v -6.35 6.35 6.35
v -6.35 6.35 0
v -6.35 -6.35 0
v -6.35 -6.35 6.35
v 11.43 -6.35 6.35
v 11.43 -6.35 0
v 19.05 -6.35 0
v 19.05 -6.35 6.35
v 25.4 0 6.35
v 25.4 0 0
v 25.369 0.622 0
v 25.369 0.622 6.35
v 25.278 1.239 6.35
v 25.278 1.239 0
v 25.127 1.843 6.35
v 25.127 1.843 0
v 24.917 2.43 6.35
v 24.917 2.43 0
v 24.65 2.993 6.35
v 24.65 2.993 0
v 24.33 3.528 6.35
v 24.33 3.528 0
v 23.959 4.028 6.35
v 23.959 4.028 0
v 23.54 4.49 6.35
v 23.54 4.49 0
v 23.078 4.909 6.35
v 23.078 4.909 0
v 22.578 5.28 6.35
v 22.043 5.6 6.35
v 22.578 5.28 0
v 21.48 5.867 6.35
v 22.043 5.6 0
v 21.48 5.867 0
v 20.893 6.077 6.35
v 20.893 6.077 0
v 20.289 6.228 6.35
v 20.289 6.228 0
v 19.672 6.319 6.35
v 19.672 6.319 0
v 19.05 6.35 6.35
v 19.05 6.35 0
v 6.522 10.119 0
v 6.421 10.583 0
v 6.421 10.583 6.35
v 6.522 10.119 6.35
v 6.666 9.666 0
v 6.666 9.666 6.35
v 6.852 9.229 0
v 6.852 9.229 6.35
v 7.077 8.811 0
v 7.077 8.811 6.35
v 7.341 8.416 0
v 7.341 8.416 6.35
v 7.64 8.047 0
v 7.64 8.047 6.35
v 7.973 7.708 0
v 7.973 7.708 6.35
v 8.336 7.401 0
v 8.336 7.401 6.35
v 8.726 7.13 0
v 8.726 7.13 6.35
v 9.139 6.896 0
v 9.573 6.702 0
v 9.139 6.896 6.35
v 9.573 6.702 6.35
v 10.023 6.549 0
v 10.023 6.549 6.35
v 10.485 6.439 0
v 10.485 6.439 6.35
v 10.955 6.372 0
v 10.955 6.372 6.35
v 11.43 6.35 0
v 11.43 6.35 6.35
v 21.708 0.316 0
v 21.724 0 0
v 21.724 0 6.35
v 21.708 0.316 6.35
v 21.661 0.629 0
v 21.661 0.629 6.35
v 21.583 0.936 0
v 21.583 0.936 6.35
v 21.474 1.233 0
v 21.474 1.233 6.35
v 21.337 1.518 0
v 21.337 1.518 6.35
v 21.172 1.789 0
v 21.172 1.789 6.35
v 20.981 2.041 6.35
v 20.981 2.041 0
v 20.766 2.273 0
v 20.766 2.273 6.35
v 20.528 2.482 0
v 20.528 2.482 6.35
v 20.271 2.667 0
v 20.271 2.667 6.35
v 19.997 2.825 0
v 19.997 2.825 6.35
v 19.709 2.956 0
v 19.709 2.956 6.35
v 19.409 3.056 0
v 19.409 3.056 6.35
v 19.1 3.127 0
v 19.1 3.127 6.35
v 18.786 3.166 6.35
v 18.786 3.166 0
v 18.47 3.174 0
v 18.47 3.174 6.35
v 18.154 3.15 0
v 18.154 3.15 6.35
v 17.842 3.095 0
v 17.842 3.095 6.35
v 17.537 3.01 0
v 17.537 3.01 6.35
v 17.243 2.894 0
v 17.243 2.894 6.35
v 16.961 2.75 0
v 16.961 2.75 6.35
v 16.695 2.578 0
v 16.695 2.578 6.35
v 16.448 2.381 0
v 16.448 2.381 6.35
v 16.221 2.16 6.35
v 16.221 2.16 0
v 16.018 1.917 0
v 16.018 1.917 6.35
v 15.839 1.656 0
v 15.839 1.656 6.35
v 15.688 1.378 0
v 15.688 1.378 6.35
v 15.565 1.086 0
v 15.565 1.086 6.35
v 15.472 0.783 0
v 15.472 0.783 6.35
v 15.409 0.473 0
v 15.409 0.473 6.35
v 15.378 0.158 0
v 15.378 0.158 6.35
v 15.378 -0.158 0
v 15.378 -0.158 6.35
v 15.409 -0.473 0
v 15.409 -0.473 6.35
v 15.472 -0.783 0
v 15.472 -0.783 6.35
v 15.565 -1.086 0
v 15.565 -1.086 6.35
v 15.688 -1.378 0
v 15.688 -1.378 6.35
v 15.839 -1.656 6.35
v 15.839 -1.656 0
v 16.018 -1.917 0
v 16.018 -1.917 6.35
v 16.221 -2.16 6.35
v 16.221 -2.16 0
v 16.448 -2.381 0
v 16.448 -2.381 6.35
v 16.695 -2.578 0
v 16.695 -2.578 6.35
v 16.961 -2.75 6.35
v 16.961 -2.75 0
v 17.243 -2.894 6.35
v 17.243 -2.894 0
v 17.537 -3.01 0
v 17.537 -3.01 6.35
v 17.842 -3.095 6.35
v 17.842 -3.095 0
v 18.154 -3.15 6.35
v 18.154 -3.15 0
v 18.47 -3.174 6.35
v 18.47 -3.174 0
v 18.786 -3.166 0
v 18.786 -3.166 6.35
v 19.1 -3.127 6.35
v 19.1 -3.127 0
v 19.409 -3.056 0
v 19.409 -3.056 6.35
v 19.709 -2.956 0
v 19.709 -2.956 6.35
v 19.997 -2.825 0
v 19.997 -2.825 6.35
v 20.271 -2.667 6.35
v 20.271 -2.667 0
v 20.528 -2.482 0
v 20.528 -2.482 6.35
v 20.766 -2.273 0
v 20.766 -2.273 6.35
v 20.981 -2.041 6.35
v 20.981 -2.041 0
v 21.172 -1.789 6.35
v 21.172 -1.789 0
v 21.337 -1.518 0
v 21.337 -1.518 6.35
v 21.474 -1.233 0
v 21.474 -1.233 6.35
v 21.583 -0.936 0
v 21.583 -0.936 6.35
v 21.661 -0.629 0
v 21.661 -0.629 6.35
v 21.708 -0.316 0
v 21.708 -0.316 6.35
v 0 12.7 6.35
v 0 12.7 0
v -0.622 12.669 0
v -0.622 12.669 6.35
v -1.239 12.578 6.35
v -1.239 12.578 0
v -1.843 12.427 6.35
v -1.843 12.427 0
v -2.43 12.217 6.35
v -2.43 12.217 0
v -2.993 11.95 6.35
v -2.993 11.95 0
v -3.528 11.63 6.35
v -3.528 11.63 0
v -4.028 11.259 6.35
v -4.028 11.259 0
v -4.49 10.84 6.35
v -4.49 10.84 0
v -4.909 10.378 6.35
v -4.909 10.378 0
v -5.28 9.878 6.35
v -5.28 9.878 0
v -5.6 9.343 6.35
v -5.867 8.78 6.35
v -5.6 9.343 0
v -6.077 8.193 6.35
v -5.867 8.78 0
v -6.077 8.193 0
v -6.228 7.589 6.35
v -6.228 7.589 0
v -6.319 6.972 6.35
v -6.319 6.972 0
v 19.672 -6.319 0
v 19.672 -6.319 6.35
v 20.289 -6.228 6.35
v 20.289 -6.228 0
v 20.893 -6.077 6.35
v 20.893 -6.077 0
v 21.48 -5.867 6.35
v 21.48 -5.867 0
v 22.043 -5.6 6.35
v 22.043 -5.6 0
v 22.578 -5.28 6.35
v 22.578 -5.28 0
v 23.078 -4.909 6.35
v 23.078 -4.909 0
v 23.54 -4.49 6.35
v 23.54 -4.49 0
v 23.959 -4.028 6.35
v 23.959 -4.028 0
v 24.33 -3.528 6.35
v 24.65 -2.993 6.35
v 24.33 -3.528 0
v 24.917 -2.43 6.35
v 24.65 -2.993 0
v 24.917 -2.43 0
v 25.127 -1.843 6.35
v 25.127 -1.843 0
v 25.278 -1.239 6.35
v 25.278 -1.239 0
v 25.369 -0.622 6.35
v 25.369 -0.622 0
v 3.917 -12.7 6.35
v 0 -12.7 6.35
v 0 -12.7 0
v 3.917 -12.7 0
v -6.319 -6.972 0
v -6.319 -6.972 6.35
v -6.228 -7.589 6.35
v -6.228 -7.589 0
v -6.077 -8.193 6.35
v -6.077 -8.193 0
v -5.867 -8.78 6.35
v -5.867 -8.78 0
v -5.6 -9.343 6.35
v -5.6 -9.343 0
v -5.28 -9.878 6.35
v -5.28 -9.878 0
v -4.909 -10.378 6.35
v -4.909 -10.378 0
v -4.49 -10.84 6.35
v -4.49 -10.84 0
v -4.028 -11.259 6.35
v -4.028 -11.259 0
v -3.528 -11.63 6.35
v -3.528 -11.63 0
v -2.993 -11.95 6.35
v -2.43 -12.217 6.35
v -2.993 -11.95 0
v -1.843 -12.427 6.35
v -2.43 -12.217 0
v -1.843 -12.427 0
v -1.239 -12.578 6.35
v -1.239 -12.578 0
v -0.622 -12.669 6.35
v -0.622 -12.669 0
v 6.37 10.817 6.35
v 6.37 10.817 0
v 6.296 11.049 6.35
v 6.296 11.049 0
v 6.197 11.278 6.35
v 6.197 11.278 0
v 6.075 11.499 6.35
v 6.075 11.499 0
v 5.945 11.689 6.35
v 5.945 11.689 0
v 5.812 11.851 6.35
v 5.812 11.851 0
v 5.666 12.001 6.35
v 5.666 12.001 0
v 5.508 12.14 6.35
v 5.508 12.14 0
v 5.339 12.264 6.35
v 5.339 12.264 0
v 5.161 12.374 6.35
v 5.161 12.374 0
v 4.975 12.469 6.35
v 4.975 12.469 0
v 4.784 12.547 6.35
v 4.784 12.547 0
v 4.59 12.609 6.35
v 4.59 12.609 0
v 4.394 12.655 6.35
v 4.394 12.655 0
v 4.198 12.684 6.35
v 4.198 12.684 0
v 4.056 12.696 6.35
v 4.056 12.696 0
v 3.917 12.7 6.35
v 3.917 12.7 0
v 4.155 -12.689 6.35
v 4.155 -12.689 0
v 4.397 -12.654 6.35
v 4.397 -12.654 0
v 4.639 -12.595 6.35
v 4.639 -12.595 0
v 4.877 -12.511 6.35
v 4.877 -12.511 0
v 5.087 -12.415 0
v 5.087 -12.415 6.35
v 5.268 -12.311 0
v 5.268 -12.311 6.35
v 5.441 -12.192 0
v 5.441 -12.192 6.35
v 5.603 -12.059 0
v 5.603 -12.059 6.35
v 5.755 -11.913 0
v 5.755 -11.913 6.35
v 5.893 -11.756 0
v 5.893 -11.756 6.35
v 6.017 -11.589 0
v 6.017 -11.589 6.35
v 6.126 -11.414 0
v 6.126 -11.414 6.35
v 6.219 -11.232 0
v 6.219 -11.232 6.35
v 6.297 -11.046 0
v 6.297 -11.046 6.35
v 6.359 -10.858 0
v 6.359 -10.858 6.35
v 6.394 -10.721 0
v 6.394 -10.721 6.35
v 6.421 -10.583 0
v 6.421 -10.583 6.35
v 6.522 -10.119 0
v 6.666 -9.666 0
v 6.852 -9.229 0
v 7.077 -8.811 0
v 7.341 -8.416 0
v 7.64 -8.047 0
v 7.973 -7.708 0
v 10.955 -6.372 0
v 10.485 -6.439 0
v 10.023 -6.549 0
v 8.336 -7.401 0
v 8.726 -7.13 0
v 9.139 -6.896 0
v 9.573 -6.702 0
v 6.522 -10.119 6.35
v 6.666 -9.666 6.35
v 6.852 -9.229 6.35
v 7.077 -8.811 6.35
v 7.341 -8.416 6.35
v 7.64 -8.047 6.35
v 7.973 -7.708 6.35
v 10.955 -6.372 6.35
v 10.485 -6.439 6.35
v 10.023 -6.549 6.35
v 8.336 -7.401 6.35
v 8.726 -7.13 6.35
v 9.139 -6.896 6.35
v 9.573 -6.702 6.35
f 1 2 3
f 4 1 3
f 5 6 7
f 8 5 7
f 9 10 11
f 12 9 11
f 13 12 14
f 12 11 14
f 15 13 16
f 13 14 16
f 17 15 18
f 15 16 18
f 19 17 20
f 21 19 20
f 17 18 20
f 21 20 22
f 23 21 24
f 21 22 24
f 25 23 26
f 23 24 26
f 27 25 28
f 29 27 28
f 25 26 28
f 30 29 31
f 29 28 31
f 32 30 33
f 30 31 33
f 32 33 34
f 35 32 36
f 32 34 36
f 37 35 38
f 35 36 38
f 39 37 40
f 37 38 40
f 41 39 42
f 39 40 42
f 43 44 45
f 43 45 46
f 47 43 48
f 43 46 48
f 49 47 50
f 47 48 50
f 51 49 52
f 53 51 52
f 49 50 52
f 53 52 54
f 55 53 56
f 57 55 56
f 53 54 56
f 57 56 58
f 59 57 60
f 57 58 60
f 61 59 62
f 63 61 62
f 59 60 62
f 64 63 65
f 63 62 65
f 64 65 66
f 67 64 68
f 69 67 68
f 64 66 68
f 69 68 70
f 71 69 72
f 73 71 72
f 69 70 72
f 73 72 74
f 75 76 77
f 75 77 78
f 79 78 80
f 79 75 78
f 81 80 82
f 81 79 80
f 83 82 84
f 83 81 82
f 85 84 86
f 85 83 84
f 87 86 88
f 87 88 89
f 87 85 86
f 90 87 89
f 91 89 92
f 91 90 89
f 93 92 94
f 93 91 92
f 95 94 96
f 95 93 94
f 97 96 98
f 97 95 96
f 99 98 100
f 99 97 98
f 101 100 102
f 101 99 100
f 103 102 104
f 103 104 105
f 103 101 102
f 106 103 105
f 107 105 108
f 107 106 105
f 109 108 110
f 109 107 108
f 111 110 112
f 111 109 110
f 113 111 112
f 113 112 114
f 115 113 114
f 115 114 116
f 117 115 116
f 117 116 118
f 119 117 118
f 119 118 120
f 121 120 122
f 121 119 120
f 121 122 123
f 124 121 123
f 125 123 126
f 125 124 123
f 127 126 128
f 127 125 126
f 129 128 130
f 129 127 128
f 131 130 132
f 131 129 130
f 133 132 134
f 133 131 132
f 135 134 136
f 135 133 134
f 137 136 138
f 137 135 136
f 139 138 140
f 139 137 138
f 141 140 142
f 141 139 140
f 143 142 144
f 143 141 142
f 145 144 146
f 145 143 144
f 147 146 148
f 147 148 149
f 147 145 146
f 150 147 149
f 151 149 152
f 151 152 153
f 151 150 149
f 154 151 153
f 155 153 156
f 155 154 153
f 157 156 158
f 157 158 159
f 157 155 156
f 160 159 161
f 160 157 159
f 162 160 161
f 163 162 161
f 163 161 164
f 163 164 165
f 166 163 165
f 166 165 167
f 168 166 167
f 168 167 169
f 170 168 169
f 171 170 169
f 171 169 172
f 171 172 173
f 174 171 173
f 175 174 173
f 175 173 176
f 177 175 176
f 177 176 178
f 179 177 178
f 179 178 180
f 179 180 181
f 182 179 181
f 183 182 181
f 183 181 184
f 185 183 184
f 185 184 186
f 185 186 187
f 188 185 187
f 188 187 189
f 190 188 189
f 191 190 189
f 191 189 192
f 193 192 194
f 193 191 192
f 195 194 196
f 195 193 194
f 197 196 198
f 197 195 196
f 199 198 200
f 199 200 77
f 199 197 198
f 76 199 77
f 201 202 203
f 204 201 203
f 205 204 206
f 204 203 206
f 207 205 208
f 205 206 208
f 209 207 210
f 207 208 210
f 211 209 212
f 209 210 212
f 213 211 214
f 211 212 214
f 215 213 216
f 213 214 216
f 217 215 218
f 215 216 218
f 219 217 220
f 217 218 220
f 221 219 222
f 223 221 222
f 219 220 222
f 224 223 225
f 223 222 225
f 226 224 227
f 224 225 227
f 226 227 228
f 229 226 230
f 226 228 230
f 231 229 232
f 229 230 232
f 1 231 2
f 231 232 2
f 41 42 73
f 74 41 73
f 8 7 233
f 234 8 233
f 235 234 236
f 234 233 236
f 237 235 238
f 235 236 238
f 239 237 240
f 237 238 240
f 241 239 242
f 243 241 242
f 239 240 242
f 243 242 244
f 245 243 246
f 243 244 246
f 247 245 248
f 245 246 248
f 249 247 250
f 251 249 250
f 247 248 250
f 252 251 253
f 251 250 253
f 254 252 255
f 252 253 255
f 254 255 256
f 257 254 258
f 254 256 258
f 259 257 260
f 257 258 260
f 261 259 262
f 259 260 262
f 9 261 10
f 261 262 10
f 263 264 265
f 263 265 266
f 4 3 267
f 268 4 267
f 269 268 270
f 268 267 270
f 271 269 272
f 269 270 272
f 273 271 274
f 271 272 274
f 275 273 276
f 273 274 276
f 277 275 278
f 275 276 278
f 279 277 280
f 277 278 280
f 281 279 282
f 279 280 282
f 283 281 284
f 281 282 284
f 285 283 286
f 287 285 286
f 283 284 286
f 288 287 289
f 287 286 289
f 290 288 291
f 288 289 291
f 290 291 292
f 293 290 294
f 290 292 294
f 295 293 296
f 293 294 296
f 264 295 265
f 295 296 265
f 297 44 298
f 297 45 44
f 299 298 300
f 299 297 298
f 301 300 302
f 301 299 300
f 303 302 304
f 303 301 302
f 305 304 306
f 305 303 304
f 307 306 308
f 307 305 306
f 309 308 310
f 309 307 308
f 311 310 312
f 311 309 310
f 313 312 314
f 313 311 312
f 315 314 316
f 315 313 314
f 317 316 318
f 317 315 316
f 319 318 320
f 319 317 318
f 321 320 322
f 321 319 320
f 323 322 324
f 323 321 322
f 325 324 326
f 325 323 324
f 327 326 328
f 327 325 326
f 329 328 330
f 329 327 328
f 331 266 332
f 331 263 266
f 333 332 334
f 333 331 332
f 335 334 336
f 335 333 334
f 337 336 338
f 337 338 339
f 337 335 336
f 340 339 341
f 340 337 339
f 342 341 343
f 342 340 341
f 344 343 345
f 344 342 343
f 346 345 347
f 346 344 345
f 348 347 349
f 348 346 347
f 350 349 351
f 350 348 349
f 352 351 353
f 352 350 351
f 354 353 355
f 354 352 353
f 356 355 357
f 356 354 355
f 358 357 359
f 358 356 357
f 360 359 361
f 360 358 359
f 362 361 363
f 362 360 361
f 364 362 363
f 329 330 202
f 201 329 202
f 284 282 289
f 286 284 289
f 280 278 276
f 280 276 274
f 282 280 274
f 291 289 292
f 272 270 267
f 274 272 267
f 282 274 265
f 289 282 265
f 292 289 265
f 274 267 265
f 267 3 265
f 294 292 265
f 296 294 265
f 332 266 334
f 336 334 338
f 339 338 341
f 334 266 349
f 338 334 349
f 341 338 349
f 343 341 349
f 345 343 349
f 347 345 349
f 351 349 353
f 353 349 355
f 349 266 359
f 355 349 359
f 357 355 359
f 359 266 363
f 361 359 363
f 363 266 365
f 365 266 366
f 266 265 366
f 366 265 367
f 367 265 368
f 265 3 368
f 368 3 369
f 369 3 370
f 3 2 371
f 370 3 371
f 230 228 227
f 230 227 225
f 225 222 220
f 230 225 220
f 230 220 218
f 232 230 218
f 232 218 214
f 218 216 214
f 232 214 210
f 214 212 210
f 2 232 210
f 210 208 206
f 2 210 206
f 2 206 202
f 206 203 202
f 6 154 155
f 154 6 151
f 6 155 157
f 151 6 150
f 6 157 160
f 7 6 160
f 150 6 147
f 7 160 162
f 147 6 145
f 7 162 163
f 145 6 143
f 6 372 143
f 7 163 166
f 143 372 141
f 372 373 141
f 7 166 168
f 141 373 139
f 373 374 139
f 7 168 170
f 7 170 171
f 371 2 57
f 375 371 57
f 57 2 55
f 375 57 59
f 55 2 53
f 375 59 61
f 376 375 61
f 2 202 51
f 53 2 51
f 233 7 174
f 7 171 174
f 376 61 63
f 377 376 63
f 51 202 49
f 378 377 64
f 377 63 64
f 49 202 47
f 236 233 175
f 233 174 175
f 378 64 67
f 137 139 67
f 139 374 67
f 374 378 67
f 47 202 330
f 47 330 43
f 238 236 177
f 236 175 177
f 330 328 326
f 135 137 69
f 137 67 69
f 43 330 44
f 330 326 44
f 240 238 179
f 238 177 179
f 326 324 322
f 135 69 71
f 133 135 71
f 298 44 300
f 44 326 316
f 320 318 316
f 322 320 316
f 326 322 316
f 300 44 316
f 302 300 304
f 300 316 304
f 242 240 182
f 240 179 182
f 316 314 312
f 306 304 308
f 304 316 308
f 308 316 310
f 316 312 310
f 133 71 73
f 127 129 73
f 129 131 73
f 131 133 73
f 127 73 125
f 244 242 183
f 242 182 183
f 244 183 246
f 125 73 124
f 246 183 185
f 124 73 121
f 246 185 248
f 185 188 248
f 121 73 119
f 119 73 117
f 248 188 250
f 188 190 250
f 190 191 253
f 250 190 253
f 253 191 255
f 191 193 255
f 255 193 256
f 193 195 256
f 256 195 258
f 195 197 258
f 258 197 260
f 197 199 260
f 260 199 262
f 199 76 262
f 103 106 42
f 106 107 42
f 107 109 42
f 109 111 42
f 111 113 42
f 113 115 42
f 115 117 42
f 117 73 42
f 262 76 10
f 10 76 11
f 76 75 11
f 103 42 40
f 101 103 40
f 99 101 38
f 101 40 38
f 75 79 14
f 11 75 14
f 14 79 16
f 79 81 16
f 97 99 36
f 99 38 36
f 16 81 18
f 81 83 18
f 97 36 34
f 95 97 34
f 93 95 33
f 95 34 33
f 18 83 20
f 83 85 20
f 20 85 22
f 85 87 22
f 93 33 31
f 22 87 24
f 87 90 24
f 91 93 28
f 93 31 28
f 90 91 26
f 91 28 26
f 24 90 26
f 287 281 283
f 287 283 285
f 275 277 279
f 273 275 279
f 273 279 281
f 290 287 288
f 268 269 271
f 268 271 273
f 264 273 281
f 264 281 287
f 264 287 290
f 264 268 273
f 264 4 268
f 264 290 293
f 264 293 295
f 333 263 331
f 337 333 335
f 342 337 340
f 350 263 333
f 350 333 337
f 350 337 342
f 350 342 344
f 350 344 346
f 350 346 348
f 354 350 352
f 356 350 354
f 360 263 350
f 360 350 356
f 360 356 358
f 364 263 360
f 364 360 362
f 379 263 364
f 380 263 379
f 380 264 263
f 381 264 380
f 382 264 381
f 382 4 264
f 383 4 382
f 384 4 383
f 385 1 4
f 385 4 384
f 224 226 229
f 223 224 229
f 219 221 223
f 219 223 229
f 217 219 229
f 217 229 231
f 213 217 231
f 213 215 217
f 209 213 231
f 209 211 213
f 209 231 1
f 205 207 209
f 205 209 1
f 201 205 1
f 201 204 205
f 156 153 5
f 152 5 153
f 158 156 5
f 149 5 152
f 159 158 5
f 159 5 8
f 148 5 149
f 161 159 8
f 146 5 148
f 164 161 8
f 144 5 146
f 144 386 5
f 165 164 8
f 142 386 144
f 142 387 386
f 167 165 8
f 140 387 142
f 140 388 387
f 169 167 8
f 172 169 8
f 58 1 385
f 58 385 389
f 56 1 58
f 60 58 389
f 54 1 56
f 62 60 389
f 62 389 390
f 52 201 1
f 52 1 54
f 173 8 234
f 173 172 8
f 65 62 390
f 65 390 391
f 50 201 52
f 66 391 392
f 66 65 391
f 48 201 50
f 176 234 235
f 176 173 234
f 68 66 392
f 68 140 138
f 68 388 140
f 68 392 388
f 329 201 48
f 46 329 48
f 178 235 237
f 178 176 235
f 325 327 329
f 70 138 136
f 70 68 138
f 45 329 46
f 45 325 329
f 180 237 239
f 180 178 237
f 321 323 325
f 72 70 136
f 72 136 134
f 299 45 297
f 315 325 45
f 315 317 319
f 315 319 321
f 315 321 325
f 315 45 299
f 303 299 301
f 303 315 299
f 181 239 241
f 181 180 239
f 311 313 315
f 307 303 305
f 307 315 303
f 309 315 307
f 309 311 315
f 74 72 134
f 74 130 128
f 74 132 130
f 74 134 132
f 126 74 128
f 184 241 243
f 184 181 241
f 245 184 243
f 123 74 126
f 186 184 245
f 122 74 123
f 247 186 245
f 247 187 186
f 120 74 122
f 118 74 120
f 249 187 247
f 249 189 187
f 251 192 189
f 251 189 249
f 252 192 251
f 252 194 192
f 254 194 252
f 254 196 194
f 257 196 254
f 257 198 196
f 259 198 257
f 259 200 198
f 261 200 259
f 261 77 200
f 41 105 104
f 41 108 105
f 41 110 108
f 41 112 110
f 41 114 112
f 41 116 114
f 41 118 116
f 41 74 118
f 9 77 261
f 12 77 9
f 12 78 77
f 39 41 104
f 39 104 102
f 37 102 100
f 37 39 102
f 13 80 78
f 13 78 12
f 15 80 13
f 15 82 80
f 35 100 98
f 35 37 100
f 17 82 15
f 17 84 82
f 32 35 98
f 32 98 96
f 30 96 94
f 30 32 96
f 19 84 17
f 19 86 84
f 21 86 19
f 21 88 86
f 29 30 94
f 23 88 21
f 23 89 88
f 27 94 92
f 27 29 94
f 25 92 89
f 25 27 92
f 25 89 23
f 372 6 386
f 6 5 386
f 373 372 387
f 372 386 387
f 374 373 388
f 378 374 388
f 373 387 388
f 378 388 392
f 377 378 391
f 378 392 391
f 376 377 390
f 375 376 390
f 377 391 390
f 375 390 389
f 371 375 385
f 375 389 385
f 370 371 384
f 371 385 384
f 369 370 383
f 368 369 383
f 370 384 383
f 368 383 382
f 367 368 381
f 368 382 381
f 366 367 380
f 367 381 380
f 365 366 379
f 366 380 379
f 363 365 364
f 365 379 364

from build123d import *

# Parameters (mm, degrees)
F0_R     = 3.175
F1_DEPTH = 6.35
F2_R     = 5.08
F3_R     = 2.54


with BuildPart() as f1:
    # F0 (on Top) → F1 (new body)
    with BuildSketch(Plane.XY):
        with BuildLine():
            Line((6.35, 6.35), (6.35, 12.7))
            Line((6.35, 12.7), (0, 12.7))
            ThreePointArc((0, 12.7), (-4.490128, 10.840128), (-6.35, 6.35))
            Line((-6.35, 6.35), (-6.35, -6.35))
            ThreePointArc((-6.35, -6.35), (-4.490128, -10.840128), (0, -12.7))
            Line((0, -12.7), (6.35, -12.7))
            Line((6.35, -12.7), (6.35, -6.35))
            Line((6.35, -6.35), (12.7, -6.35))
            Line((12.7, -6.35), (19.05, -6.35))
            ThreePointArc((19.05, -6.35), (23.540128, -4.490128), (25.4, 0))
            ThreePointArc((25.4, 0), (23.540128, 4.490128), (19.05, 6.35))
            Line((19.05, 6.35), (6.35, 6.35))
        make_face()
        with Locations((18.548694, 0)):
            Circle(F0_R, mode=Mode.SUBTRACT)
    extrude(amount=F1_DEPTH)

    # F2
    f2_edges = [f1.edges().sort_by_distance(p)[0] for p in [
        (6.35, -6.35, 3.175),
        (6.35, 6.35, 3.175),
    ]]
    fillet(f2_edges, radius=F2_R)

    # F3
    f3_edges = [f1.edges().sort_by_distance(p)[0] for p in [
        (6.35, 12.7, 3.175),
        (6.35, -12.7, 3.175),
    ]]
    fillet(f3_edges, radius=F3_R)


solid = f1.part
